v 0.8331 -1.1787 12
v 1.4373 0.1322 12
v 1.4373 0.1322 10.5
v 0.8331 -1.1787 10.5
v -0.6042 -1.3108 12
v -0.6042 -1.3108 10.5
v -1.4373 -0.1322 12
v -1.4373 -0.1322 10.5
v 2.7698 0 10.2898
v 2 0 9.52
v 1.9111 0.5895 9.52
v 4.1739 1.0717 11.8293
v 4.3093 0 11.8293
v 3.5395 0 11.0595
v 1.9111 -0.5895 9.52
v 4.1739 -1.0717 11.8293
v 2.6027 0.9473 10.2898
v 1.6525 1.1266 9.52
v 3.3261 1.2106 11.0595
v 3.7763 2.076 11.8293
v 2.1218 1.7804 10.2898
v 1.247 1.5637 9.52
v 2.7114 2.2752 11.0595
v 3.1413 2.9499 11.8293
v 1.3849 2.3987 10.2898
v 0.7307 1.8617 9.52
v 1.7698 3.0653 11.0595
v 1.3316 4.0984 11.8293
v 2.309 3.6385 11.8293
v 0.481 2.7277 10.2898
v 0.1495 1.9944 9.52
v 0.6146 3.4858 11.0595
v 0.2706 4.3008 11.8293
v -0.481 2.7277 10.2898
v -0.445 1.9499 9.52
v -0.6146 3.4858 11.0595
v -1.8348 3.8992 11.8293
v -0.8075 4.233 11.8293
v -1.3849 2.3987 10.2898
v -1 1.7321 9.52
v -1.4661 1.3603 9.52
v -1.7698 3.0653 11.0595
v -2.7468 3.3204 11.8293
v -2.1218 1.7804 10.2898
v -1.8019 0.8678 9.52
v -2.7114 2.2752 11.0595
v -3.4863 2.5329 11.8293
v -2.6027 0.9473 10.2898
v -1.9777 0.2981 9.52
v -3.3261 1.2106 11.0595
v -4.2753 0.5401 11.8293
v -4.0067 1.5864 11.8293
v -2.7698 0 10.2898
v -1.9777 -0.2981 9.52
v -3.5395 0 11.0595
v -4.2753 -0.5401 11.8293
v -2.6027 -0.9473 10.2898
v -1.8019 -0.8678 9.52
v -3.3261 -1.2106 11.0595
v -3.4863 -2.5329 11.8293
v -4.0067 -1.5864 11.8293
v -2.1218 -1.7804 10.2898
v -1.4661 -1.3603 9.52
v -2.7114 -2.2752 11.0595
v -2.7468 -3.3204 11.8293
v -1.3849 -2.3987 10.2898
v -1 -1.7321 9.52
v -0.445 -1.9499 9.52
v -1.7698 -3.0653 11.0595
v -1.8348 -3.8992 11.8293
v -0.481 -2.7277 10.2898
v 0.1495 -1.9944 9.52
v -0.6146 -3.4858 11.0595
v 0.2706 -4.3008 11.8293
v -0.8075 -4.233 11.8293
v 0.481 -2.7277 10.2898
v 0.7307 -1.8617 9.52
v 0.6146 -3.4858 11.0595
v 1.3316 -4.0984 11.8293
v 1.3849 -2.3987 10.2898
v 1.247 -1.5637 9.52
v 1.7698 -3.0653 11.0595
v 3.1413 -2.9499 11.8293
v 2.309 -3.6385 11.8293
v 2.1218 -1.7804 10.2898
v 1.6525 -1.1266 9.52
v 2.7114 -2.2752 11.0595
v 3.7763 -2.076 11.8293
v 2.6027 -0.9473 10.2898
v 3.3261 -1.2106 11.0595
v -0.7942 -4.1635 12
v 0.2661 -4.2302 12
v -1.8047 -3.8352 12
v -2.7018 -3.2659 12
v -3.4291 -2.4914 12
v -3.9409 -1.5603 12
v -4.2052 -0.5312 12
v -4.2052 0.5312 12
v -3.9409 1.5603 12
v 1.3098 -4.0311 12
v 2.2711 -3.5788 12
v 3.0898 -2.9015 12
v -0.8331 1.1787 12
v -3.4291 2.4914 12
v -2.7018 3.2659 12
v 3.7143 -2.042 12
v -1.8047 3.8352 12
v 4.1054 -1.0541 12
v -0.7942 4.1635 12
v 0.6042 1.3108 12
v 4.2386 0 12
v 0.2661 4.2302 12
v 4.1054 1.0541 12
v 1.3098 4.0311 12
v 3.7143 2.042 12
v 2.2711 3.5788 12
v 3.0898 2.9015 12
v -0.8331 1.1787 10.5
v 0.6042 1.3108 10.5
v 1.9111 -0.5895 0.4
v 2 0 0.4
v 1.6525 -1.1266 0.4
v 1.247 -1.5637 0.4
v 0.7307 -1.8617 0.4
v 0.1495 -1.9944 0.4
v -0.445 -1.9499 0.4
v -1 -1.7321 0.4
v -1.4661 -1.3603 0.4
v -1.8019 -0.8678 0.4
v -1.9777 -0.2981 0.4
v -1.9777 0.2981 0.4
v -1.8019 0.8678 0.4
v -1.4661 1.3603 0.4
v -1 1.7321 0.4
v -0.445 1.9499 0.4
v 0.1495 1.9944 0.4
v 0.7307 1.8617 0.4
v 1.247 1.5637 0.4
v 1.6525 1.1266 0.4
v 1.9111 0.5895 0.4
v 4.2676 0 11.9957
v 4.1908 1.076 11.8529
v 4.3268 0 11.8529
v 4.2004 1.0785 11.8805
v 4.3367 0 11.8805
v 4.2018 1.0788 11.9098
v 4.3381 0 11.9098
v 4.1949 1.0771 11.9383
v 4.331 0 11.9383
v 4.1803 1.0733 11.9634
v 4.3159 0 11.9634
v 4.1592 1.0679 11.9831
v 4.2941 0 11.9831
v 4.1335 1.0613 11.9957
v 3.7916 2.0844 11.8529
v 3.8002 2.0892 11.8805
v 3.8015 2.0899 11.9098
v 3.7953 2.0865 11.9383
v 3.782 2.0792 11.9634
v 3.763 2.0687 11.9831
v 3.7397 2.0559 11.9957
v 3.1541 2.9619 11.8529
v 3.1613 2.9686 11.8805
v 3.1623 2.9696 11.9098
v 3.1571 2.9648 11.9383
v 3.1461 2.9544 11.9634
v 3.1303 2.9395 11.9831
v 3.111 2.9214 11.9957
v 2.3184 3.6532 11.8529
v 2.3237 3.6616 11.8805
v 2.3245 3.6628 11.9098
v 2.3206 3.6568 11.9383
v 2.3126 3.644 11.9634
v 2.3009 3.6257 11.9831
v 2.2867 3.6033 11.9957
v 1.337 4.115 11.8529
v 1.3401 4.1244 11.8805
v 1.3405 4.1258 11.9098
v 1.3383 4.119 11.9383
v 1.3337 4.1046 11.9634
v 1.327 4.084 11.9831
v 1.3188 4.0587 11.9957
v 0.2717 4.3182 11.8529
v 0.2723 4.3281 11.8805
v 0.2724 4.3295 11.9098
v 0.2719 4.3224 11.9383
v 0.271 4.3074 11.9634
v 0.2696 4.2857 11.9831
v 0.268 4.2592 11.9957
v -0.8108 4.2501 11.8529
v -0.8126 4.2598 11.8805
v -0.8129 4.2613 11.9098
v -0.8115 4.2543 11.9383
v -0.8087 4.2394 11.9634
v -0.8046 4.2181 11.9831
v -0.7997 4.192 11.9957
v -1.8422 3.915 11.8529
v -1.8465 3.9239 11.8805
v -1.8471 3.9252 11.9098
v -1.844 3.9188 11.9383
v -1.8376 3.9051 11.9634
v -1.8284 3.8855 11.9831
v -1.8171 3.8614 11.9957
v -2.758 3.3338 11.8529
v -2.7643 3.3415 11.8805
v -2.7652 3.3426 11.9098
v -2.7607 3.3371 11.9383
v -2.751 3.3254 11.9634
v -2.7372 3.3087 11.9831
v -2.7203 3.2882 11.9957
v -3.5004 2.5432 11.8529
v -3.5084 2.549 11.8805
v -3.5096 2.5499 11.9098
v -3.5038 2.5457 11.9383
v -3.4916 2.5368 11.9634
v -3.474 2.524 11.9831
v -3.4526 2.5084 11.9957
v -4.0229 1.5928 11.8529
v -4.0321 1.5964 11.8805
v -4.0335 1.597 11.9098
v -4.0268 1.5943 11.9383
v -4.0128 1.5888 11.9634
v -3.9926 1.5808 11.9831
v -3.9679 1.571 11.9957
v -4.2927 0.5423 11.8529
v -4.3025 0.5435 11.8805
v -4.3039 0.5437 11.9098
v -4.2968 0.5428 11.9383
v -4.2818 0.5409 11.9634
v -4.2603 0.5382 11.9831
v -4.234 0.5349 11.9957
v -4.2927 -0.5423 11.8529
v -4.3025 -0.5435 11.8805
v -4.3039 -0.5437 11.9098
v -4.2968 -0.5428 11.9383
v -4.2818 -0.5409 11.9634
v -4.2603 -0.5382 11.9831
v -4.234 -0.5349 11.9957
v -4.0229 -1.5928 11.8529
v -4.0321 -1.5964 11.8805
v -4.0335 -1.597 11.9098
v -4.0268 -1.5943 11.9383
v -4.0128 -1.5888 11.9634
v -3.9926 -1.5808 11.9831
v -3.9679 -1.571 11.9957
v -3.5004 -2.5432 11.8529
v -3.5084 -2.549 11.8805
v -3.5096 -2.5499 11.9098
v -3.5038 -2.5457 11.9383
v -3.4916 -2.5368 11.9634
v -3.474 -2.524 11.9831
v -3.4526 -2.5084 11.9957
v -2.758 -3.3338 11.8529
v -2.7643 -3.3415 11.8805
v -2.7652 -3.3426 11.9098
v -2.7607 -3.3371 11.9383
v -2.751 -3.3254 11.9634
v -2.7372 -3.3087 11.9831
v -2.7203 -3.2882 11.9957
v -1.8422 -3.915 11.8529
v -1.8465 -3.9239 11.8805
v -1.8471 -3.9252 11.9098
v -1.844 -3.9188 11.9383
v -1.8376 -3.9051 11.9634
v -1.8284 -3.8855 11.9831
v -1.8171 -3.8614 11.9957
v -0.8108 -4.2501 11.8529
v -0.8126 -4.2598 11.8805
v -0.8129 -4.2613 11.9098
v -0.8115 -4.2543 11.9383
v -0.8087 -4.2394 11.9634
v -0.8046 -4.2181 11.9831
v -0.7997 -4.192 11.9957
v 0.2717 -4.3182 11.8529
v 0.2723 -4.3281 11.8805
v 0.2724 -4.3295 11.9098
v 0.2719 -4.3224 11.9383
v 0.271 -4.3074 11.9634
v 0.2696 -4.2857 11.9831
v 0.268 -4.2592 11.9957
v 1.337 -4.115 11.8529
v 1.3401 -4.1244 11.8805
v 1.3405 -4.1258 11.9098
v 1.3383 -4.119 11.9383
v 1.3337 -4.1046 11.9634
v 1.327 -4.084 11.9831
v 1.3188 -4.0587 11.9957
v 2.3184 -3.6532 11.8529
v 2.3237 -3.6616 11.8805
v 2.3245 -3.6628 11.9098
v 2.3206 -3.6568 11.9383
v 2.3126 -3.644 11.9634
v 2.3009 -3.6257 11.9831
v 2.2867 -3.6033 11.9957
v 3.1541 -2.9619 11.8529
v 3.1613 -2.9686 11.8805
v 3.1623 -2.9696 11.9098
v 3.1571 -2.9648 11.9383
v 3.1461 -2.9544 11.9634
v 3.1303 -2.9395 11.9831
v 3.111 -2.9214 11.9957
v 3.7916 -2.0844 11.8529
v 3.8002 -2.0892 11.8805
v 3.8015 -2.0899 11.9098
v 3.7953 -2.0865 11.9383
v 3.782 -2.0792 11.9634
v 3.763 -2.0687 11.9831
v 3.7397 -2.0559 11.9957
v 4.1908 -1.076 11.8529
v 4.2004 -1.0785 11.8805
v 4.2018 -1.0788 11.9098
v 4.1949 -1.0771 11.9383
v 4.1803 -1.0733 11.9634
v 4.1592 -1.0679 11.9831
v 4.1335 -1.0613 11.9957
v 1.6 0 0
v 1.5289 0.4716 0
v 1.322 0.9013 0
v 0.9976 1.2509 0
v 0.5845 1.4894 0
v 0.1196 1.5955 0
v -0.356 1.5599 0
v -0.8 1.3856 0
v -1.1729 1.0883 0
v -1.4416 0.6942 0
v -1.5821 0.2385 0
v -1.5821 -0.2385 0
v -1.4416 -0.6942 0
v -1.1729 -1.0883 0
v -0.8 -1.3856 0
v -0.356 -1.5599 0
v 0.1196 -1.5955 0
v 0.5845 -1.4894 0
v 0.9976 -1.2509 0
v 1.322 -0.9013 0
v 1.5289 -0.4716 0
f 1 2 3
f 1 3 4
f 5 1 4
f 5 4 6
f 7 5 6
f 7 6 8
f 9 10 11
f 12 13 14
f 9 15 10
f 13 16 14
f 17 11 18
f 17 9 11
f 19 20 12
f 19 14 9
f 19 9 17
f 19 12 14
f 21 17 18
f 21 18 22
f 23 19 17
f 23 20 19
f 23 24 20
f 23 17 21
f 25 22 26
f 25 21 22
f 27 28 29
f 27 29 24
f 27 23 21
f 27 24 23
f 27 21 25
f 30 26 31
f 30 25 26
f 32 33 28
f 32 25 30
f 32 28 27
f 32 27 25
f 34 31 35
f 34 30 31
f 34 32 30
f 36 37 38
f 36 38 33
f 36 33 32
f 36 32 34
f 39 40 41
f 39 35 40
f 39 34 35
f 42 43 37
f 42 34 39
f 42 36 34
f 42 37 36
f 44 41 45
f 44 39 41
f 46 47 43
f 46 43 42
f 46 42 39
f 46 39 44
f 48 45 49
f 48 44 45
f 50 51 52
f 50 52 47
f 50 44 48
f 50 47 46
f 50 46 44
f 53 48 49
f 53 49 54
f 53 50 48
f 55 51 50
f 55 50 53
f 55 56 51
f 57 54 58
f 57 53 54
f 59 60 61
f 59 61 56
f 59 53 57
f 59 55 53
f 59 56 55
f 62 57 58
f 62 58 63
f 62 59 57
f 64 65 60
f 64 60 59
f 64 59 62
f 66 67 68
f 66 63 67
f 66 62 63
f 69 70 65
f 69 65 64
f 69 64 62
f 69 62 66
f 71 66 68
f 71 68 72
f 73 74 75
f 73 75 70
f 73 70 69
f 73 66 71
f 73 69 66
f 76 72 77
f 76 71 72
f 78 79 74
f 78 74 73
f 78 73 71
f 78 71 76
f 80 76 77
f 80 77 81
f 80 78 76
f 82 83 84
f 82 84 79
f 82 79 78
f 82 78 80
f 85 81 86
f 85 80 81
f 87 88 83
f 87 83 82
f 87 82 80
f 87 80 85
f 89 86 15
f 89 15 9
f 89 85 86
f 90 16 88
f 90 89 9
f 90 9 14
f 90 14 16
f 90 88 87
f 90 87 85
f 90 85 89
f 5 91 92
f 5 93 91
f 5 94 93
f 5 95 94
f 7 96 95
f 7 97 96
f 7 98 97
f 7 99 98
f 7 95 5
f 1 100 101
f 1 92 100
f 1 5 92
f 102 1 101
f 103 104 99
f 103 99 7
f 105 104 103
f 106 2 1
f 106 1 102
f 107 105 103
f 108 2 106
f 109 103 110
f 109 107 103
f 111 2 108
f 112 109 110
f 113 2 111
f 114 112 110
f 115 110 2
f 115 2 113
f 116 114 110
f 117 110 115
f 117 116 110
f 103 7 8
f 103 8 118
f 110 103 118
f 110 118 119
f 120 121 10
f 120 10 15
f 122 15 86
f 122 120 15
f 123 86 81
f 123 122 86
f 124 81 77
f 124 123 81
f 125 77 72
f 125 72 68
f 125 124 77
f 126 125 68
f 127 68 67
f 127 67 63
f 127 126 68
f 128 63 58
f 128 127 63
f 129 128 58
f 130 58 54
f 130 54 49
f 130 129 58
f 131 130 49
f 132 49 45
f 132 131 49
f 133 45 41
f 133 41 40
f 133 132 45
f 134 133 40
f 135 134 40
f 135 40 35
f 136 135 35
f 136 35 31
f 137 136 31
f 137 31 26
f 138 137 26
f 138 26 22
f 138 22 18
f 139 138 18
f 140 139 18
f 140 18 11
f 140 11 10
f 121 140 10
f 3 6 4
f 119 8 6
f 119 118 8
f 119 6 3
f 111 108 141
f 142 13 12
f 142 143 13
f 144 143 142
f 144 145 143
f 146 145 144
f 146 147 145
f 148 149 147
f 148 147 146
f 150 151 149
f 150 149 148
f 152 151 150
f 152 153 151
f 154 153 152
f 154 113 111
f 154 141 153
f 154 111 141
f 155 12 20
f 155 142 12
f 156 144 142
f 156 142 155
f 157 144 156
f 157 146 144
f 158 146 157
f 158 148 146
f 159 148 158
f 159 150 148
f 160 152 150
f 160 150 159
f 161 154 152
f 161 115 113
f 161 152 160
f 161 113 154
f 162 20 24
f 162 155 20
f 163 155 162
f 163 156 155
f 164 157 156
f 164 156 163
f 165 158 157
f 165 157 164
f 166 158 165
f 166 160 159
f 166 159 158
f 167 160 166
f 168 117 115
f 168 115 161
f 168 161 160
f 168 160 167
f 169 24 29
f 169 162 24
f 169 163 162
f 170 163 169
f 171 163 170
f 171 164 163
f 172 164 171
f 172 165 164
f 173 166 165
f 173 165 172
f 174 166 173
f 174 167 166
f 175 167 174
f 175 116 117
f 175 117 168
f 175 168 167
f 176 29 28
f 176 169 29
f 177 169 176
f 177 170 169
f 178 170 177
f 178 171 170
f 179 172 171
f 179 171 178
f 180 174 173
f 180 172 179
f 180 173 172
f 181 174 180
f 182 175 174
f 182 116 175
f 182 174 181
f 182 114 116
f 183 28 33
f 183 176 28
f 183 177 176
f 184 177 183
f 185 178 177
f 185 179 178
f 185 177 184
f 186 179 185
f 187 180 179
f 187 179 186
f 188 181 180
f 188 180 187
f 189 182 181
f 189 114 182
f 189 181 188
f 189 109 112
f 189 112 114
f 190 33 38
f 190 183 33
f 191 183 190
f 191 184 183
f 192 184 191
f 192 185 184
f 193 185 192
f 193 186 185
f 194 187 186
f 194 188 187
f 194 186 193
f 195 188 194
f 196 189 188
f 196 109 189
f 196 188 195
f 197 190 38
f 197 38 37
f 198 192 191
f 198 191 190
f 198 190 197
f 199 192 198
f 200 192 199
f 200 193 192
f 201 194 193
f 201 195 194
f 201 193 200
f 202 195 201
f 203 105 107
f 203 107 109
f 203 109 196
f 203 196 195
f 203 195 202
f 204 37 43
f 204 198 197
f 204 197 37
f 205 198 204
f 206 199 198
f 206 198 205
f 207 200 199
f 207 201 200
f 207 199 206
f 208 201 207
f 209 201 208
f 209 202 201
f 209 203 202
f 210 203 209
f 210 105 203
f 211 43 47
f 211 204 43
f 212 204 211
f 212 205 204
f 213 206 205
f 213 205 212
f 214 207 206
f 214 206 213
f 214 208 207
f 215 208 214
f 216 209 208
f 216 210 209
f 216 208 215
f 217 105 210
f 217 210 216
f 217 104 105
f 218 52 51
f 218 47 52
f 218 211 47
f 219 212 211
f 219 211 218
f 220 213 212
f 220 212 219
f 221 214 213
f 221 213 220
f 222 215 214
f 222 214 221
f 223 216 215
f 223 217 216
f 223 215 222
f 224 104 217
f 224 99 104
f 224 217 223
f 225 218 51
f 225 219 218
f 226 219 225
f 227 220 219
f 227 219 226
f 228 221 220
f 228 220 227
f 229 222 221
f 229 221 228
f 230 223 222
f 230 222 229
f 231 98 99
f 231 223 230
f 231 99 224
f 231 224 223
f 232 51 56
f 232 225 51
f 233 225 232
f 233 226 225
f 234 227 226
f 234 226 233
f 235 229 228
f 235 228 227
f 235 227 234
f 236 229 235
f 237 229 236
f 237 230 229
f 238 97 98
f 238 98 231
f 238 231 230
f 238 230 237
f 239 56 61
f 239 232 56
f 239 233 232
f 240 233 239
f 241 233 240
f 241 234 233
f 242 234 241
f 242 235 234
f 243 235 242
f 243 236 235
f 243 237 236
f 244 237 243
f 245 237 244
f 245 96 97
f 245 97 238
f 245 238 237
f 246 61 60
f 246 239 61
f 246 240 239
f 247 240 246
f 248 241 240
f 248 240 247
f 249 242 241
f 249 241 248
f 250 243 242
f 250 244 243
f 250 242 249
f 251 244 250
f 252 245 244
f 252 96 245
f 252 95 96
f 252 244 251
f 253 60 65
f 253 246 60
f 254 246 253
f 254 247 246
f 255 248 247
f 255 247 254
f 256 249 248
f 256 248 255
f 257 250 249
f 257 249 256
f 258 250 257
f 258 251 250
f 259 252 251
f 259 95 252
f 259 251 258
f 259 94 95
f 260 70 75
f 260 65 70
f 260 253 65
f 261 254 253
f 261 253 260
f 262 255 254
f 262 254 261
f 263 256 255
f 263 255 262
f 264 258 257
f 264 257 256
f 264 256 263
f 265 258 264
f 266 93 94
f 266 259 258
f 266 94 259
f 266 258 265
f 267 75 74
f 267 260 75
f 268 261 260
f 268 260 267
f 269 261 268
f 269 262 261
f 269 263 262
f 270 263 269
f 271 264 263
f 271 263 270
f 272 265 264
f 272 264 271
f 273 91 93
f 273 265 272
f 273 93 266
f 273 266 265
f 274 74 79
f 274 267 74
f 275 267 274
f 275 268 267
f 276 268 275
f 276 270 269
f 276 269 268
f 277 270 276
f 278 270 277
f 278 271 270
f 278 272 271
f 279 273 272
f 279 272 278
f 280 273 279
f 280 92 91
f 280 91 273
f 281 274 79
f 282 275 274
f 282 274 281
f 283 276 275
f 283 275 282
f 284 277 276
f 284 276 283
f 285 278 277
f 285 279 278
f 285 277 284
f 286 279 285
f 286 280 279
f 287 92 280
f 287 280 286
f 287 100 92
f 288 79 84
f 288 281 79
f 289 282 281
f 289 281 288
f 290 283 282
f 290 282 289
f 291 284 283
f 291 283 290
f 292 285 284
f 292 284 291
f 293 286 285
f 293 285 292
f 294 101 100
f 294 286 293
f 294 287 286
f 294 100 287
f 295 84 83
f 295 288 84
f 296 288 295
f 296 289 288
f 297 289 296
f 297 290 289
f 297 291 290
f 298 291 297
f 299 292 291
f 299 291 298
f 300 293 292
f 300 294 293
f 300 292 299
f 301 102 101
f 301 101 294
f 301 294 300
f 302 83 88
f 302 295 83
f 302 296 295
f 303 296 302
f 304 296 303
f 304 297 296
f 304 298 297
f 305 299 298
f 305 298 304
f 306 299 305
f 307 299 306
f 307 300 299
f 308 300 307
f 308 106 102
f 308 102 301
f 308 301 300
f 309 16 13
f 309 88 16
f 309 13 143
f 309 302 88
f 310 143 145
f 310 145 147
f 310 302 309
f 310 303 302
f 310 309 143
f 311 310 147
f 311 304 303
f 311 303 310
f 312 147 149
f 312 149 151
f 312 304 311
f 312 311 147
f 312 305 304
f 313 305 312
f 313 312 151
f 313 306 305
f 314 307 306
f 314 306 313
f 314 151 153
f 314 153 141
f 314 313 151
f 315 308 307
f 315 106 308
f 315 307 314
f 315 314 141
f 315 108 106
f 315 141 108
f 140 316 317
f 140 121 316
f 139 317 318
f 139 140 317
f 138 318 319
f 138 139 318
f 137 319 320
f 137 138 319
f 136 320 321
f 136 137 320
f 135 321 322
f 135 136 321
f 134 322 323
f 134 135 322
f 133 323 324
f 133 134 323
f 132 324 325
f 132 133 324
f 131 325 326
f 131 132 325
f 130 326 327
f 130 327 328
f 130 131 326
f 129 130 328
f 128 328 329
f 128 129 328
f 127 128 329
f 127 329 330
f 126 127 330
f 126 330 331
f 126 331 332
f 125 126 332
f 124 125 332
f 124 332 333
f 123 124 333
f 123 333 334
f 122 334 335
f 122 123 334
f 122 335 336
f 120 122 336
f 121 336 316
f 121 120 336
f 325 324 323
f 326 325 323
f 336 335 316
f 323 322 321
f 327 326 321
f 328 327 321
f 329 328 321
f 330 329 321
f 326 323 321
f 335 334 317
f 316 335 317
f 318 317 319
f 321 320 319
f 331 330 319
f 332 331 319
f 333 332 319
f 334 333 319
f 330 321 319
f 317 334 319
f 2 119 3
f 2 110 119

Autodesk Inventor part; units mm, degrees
ref_plane "YZ Plane" through (0, 0, 0) normal (1, 0, 0) x (0, 1, 0)
ref_plane "XZ Plane" through (0, 0, 0) normal (0, 1, 0) x (-1, 0, 0)
ref_plane "XY Plane" through (0, 0, 0) normal (0, 0, 1) x (1, 0, 0)
sketch "Sketch1" plane through (0, 0, 0) normal (0, 0, 1) x (1, 0, 0)
  circle A0 centre (0, 0) radius 2
  dimension "Diameter" = 4
extrude "Extrusion1" add sketch "Sketch1" along normal blind 9.52
sketch "Sketch2" plane through (0, 0, 9.52) normal (0, 0, 1) x (1, 0, 0)
  circle A0 centre (0, 0) radius 2 projected
extrude "Extrusion2" add sketch "Sketch2" along normal blind 2.48 draft 45
sketch "Sketch3" plane through (0, 0, 12) normal (0, 0, 1) x (1, 0, 0)
  circle A0 centre (0, 0) radius 4.48 projected
  circle A1 centre (0, 0) radius 1.4434 construction
  line L0 (0.6042, 1.3108) -> (1.4373, 0.1322)
  line L1 (1.4373, 0.1322) -> (0.8331, -1.1787)
  line L2 (0.8331, -1.1787) -> (-0.6042, -1.3108)
  line L3 (-0.6042, -1.3108) -> (-1.4373, -0.1322)
  line L4 (-1.4373, -0.1322) -> (-0.8331, 1.1787)
  line L5 (-0.8331, 1.1787) -> (0.6042, 1.3108)
  dimension "Hex_Width" = 2.5
extrude "Extrusion3" cut sketch "Sketch3" against normal blind 1.5 contours L0 L1 L2 L3 L4 L5
thread "Thread1" size "M4x0.7" class "4g6g" standard "ANSI Metric M Profile" full length
chamfer "Chamfer2" distance 0.4 angle 45 1 edges at (-2, 0, 0)
fillet "Fillet1" radius 0.1 1 edges at (-4.48, 0, 12)
equation "\"d13\" = Chamfer"
equation "\"Thread_Length\" = 7.52"
equation "\"Chamfer\" = 0.4"
properties part number "SCREW, FLAT HD, P, 12_9, M4X0_7X12MM"
